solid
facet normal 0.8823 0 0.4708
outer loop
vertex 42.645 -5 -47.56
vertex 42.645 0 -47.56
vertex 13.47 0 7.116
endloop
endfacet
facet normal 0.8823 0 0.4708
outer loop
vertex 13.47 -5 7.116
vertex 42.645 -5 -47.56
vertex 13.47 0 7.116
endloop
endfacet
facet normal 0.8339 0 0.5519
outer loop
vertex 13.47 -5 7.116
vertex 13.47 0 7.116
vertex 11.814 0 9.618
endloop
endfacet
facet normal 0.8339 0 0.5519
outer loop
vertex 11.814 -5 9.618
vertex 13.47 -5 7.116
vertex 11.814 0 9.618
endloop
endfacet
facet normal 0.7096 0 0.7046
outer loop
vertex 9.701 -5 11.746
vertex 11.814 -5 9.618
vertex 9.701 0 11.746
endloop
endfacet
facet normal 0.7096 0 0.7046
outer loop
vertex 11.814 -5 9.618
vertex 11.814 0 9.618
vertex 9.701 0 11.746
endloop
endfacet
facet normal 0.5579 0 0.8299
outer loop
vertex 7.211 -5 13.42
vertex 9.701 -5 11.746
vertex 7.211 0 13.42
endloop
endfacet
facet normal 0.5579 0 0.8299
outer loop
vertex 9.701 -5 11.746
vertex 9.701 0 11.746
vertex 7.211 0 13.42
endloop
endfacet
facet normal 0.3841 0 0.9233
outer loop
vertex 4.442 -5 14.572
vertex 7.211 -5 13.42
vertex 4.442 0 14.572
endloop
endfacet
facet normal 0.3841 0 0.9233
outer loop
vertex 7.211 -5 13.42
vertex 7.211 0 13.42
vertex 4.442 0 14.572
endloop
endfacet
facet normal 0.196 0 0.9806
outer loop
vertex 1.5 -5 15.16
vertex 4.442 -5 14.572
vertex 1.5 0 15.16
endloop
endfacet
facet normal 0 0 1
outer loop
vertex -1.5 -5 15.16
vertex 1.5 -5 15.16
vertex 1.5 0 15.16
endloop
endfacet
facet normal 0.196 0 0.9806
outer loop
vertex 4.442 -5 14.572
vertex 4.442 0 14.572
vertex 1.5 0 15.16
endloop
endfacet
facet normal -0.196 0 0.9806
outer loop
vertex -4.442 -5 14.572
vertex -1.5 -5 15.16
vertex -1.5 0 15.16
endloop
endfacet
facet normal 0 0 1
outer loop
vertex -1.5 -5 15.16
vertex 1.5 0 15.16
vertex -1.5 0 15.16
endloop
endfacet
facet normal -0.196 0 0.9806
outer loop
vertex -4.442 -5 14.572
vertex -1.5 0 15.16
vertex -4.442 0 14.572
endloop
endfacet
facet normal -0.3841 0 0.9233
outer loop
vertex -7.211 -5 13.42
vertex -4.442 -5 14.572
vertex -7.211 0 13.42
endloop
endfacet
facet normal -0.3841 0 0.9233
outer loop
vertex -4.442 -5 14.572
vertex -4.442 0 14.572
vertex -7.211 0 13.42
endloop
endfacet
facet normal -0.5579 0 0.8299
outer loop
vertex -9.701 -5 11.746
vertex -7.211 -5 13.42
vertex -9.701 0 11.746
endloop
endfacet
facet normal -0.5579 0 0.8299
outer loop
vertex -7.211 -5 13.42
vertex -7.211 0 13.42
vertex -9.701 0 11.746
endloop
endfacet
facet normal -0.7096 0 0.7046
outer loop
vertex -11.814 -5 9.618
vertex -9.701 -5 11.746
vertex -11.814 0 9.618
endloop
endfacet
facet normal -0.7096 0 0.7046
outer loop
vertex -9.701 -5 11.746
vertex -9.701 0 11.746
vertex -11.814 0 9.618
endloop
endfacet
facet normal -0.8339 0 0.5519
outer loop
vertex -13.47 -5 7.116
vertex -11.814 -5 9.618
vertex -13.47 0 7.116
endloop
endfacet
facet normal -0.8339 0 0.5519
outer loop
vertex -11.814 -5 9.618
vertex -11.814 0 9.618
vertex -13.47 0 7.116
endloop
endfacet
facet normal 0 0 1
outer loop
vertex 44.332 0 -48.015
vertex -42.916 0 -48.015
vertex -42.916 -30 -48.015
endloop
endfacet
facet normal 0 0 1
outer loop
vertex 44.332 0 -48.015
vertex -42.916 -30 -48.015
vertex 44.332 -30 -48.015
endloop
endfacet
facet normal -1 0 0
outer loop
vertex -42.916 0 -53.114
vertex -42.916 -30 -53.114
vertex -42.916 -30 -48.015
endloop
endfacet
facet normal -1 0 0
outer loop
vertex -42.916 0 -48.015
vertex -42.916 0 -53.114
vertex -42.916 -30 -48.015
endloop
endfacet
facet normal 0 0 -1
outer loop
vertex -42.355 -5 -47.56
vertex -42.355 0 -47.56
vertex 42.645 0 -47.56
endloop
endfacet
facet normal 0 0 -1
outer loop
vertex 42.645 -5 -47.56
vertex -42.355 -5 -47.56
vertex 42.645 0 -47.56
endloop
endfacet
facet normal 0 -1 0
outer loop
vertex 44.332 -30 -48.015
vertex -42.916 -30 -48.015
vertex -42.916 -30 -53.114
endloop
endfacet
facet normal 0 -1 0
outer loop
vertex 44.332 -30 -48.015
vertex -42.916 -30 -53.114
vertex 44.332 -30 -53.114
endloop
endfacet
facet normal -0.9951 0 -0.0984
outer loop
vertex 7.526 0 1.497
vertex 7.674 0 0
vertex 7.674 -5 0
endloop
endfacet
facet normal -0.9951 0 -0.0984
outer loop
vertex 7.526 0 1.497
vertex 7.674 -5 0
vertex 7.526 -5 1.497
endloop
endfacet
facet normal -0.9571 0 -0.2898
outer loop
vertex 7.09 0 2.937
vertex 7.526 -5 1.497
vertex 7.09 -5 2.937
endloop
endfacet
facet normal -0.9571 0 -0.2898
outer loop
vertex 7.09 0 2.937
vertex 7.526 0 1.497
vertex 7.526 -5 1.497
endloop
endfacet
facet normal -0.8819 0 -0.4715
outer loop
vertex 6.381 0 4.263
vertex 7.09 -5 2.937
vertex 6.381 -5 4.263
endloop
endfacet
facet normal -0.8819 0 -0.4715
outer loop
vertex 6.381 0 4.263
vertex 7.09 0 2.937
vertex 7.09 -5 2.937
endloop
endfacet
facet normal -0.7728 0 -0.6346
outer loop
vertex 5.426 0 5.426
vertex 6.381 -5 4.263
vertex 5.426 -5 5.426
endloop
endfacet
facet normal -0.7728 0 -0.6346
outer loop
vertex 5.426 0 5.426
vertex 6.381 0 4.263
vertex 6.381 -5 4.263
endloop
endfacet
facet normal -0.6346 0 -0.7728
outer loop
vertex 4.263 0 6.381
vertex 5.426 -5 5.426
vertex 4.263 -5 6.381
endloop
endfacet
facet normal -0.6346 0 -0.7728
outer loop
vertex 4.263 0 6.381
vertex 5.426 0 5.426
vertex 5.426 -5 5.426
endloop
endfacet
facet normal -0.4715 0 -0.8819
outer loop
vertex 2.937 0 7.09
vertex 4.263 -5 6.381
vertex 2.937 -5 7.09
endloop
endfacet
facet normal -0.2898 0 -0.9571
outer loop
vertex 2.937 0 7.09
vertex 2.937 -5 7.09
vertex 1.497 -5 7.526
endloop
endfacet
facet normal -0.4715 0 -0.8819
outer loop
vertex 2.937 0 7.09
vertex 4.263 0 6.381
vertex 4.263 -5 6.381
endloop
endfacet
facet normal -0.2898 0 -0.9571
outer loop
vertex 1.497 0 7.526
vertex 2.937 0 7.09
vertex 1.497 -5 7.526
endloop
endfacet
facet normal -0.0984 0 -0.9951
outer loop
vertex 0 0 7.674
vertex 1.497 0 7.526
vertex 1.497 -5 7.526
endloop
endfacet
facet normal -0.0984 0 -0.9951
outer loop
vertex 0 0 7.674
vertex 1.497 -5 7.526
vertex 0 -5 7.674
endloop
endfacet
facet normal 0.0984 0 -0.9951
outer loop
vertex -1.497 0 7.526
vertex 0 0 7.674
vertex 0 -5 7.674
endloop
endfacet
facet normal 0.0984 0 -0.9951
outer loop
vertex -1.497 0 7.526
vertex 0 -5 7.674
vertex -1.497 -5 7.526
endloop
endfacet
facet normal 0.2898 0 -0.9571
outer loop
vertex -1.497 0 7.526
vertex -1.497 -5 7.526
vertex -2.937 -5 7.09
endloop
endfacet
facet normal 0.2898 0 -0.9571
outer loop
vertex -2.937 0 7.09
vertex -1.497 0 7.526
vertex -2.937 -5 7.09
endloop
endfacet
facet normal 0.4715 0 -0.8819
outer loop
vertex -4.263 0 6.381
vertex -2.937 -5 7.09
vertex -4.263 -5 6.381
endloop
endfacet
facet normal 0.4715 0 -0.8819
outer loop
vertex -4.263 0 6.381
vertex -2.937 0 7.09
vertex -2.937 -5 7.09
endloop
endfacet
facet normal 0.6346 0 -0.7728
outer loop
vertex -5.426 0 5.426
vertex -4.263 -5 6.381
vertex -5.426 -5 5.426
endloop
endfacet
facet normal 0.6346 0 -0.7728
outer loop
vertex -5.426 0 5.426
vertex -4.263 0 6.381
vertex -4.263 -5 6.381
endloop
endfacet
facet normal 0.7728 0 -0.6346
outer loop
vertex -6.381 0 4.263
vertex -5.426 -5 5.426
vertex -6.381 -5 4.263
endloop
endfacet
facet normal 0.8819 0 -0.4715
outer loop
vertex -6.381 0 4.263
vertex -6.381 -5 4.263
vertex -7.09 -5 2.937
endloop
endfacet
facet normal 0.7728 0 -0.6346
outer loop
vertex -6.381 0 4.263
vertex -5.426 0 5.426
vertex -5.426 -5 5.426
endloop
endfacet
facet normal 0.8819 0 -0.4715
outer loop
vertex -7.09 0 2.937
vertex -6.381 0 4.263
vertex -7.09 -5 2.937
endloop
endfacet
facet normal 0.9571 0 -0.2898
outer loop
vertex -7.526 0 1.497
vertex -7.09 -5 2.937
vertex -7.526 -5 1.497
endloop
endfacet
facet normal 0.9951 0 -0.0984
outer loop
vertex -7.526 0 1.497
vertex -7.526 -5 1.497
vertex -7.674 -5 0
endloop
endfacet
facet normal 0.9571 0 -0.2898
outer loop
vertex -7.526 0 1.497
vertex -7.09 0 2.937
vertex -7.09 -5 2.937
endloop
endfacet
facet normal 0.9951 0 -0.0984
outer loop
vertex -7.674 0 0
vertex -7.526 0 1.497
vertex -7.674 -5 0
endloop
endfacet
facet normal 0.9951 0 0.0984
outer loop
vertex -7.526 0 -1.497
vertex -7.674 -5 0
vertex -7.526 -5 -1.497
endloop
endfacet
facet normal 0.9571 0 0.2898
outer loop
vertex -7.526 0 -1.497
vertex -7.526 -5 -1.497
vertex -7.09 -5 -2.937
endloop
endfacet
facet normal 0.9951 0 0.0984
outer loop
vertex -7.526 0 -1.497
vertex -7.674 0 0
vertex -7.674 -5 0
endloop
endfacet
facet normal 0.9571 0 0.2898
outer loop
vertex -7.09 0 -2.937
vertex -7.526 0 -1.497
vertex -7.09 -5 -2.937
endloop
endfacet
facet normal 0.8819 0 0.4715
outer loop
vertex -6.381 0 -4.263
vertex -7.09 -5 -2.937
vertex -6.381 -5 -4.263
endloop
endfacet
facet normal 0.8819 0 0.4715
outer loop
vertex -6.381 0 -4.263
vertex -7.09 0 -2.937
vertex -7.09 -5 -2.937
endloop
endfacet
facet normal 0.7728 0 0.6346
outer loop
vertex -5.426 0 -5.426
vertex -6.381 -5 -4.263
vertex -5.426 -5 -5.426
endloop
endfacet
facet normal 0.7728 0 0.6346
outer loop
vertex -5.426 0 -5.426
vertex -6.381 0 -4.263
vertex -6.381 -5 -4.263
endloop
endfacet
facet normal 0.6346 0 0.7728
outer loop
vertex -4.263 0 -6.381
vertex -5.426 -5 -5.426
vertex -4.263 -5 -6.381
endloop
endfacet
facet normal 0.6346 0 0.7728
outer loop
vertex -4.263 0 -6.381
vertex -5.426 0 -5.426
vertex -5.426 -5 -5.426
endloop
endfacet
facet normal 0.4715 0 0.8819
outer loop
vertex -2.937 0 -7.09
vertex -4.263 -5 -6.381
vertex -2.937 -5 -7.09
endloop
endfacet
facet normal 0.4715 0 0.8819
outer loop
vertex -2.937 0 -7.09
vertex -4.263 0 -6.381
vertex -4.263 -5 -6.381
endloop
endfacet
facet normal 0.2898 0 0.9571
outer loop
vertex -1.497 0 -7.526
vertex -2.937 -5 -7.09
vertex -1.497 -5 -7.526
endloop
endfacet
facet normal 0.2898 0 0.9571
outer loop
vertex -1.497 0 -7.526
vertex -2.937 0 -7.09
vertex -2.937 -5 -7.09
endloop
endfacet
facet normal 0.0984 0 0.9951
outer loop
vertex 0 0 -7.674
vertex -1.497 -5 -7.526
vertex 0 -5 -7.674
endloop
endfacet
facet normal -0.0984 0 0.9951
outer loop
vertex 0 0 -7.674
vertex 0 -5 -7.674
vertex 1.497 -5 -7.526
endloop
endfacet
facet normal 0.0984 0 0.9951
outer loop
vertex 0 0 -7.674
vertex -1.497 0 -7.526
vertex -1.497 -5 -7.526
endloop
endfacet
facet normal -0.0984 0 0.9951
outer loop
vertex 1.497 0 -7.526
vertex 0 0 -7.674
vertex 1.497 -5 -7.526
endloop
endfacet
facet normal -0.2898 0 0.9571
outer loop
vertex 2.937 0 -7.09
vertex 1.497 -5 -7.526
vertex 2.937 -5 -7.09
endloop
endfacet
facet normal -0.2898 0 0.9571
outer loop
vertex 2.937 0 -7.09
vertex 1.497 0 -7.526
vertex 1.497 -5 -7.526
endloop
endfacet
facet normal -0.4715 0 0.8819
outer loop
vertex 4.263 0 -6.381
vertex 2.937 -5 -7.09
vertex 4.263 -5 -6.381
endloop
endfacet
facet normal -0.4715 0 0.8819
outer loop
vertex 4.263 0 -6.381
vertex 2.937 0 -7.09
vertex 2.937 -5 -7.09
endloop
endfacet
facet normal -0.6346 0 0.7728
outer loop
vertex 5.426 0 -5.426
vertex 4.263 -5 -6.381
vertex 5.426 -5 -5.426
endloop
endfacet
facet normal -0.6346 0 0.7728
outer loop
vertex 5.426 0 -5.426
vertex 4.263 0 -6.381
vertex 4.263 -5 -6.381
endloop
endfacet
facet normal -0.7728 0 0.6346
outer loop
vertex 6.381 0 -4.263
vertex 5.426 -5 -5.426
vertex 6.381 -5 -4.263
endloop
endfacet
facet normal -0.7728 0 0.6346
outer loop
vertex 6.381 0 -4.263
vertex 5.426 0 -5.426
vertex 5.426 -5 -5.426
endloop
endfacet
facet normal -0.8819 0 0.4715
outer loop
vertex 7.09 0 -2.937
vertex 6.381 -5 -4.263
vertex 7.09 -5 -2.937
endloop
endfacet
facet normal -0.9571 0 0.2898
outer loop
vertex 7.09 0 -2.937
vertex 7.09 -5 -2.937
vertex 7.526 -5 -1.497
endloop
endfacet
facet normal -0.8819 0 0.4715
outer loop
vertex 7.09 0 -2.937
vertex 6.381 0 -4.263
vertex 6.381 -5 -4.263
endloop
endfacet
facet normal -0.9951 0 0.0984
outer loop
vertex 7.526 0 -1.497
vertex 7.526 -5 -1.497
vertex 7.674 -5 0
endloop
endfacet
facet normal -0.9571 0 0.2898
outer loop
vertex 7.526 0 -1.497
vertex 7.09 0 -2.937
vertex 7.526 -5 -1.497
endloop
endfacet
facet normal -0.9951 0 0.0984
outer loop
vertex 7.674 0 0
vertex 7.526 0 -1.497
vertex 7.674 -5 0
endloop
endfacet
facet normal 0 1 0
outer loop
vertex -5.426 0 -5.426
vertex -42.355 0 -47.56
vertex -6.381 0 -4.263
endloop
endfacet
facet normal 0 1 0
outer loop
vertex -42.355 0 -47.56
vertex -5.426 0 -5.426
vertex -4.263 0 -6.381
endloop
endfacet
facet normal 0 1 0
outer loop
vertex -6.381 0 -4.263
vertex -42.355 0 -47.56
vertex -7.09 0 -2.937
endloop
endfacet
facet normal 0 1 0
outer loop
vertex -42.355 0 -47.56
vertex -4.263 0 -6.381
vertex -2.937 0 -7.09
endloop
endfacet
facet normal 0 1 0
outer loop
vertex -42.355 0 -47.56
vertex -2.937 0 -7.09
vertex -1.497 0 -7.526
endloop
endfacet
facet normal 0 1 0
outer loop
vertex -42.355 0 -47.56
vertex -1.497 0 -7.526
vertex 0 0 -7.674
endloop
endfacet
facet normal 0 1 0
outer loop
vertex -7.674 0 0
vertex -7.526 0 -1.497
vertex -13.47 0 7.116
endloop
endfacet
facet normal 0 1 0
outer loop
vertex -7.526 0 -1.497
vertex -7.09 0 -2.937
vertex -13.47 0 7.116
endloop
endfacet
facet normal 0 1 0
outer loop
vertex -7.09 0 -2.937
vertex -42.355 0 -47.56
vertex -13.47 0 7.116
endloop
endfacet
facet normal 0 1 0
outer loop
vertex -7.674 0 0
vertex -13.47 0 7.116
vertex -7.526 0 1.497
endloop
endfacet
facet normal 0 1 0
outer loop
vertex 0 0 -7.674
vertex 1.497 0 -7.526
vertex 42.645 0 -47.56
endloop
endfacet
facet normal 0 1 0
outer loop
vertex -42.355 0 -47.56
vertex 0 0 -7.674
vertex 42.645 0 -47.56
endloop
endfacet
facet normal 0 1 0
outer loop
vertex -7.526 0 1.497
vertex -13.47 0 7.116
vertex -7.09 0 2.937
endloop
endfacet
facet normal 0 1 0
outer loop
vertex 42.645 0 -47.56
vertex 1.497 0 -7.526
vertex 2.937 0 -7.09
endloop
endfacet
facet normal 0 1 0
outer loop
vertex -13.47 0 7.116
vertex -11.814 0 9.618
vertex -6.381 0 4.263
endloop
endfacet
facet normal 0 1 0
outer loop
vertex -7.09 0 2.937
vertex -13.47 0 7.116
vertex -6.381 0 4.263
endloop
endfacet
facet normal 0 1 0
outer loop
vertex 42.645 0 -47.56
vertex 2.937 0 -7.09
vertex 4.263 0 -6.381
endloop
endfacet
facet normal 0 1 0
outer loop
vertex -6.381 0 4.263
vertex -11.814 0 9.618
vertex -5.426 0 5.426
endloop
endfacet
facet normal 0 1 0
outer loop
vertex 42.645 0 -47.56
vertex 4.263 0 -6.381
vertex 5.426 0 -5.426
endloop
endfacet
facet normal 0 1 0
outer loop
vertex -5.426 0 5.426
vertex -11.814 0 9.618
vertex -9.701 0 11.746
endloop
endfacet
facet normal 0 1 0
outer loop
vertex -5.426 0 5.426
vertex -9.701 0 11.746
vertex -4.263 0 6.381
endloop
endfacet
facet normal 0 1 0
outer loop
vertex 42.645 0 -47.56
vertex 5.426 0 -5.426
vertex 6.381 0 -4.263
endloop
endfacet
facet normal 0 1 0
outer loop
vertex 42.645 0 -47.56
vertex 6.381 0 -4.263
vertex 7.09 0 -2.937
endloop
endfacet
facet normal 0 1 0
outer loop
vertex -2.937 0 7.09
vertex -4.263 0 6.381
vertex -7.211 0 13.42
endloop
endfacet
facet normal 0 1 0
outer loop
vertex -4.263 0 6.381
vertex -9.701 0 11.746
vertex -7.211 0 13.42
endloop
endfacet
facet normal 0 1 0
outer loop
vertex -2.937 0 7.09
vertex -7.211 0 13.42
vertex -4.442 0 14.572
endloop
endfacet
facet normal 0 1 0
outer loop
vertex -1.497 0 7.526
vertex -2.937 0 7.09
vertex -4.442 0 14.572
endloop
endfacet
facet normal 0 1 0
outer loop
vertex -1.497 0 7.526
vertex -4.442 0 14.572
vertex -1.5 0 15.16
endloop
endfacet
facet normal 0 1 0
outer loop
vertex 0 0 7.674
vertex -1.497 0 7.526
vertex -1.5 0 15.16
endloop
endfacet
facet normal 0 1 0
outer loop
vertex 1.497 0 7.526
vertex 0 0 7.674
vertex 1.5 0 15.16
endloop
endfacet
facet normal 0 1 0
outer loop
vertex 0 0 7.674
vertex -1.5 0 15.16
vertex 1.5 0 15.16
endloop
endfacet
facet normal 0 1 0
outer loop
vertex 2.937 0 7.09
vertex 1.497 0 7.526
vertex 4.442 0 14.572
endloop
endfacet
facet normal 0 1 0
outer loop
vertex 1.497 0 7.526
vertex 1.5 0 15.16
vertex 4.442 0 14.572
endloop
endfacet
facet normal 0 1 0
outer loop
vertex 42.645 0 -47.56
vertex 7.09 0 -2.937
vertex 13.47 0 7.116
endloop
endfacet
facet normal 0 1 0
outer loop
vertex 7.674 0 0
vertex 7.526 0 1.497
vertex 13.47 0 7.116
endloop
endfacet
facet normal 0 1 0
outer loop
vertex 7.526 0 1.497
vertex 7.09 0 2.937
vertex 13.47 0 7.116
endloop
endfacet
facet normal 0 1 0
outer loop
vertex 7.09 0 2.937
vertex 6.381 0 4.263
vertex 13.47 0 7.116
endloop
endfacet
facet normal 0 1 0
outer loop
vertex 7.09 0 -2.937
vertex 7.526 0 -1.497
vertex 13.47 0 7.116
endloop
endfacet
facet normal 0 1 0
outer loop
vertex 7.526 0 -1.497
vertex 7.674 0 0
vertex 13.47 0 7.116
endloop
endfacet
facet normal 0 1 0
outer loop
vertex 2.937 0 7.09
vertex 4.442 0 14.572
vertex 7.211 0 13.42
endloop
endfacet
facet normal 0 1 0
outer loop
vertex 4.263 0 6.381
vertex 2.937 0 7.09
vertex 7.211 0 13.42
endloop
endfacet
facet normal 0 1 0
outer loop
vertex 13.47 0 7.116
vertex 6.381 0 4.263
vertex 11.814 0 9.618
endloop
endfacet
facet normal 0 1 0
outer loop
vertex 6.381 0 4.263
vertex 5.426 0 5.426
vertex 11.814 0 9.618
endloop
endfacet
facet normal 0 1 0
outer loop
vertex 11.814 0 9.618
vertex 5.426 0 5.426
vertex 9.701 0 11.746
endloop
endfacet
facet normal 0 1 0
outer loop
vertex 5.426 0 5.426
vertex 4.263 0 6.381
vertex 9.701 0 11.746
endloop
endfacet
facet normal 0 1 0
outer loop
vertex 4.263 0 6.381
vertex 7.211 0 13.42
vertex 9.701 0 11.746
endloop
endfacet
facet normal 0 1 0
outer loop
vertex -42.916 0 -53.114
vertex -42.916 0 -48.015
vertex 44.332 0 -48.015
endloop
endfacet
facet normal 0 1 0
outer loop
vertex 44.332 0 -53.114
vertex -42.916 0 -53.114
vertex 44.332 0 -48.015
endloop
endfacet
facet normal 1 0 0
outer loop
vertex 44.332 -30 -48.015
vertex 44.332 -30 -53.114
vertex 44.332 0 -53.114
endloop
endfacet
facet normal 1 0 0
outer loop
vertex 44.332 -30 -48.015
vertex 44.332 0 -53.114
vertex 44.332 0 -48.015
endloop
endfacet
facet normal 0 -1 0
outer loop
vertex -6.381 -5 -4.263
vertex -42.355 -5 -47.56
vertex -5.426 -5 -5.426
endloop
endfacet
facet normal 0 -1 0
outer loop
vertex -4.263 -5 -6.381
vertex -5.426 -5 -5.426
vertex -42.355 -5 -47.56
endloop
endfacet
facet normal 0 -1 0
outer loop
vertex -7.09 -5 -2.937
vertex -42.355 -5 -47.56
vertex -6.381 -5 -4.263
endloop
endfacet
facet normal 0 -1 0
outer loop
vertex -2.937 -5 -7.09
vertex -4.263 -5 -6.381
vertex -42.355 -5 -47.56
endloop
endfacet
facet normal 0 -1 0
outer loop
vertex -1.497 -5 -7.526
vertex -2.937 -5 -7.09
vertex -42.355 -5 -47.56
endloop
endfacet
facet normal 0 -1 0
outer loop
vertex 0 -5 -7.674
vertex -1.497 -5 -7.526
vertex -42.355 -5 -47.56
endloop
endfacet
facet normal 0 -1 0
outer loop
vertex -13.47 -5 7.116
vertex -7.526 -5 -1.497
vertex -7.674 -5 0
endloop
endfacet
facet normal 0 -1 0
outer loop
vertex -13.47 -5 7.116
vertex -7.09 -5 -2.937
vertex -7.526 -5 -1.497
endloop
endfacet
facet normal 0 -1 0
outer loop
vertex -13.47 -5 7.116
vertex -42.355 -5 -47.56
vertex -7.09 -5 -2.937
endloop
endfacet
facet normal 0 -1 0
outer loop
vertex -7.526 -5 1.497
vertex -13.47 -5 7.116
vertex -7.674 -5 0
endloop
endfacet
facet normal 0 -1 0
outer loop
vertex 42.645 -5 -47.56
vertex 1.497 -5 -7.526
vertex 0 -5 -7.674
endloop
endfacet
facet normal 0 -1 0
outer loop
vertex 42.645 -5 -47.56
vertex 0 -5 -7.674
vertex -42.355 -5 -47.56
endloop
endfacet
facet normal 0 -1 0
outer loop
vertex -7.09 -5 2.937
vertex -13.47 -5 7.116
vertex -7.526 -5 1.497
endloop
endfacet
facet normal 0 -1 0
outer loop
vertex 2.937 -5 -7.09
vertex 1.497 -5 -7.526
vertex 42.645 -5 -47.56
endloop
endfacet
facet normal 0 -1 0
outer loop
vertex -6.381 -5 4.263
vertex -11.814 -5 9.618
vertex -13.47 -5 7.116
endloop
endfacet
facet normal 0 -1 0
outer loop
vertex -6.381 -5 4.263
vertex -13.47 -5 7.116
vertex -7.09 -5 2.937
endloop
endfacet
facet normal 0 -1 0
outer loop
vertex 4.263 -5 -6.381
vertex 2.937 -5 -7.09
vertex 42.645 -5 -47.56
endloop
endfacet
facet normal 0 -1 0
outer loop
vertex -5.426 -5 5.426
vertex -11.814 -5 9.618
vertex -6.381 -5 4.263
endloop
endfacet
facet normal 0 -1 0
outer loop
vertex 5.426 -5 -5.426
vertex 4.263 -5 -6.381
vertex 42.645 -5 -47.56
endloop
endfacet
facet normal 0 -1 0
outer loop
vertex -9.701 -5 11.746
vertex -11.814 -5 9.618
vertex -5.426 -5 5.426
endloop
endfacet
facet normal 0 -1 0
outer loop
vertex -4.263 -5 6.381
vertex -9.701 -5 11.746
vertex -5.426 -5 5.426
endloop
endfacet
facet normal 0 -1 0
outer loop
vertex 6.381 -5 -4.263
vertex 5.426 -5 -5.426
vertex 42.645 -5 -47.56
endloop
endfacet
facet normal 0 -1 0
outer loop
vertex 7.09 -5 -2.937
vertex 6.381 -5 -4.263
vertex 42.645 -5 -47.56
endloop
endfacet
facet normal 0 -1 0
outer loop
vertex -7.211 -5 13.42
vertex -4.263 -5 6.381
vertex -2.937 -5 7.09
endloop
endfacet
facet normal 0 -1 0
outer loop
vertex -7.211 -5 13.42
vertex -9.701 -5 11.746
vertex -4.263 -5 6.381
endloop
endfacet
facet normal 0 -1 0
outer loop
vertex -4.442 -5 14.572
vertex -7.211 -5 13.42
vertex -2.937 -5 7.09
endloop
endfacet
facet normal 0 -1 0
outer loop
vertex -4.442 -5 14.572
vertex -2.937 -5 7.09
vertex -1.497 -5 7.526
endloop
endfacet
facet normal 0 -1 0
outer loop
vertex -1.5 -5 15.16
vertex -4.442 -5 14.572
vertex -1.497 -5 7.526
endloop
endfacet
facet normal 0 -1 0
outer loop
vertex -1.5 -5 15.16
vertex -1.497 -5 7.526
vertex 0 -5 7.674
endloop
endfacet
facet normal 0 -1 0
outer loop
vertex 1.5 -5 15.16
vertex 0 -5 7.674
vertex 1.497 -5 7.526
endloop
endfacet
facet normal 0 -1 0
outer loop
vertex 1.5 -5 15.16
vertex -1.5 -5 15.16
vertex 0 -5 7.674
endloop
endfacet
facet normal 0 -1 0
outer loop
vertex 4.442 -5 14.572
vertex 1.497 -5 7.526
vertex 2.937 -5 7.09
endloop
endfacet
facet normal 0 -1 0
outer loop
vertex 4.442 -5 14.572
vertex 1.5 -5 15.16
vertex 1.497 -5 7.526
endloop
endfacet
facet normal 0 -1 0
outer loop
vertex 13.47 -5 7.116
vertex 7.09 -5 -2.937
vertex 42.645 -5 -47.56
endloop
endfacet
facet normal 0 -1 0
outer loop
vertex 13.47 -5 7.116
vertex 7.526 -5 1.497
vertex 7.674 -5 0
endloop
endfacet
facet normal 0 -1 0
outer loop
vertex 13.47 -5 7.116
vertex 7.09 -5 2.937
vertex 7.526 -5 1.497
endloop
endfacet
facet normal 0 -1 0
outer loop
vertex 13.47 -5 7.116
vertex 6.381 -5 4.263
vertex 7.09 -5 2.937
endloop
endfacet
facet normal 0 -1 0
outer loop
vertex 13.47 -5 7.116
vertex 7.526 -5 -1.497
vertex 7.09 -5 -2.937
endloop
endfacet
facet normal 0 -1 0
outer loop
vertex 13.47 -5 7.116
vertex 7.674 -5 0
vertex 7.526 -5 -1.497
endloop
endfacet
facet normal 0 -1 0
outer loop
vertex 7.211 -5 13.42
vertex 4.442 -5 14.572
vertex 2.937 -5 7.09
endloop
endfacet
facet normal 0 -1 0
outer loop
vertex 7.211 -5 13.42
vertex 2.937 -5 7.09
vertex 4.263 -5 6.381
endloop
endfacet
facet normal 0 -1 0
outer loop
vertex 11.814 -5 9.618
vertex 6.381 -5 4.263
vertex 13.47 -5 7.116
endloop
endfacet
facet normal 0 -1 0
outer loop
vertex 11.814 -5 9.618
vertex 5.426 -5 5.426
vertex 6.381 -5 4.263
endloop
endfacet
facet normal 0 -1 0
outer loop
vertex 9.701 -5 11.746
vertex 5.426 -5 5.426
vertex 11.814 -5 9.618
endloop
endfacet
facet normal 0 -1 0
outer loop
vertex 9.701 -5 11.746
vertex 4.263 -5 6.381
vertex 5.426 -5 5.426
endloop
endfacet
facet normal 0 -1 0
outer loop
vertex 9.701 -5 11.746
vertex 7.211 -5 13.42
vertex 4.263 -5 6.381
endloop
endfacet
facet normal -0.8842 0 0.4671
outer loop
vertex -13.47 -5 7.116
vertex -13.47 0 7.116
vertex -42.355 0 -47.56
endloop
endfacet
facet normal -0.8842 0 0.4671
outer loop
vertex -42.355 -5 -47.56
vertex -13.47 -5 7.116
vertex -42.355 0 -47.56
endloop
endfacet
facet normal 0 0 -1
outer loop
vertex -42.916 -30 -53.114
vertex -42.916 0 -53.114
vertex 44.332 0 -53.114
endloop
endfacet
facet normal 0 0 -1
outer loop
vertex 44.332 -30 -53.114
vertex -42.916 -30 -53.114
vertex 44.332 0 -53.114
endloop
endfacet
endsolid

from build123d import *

# Parameters (mm, degrees)
F0_R     = 7.673828
F1_DEPTH = 5
F2_W     = 87.248202
F2_H     = 5.098917
F3_DEPTH = 30


with BuildPart() as f1:
    # F0 (on Front) → F1 (new body)
    with BuildSketch(Plane.XZ):
        with BuildLine():
            Line((42.644559, -47.559523), (13.469989, 7.116254))
            ThreePointArc((13.469989, 7.116254), (0, 15.234227), (-13.469989, 7.116254))
            Line((-13.469989, 7.116254), (-42.355441, -47.559523))
            Line((-42.355441, -47.559523), (42.644559, -47.559523))
        make_face()
        Circle(F0_R, mode=Mode.SUBTRACT)
    extrude(amount=F1_DEPTH)


with BuildPart() as f3:
    # F2 (on Front) → F3 (new body)
    with BuildSketch(Plane.XZ):
        with Locations((0.708183, -50.5643)):
            Rectangle(F2_W, F2_H)
    extrude(amount=F3_DEPTH)


solid = Compound([f1.part, f3.part])
